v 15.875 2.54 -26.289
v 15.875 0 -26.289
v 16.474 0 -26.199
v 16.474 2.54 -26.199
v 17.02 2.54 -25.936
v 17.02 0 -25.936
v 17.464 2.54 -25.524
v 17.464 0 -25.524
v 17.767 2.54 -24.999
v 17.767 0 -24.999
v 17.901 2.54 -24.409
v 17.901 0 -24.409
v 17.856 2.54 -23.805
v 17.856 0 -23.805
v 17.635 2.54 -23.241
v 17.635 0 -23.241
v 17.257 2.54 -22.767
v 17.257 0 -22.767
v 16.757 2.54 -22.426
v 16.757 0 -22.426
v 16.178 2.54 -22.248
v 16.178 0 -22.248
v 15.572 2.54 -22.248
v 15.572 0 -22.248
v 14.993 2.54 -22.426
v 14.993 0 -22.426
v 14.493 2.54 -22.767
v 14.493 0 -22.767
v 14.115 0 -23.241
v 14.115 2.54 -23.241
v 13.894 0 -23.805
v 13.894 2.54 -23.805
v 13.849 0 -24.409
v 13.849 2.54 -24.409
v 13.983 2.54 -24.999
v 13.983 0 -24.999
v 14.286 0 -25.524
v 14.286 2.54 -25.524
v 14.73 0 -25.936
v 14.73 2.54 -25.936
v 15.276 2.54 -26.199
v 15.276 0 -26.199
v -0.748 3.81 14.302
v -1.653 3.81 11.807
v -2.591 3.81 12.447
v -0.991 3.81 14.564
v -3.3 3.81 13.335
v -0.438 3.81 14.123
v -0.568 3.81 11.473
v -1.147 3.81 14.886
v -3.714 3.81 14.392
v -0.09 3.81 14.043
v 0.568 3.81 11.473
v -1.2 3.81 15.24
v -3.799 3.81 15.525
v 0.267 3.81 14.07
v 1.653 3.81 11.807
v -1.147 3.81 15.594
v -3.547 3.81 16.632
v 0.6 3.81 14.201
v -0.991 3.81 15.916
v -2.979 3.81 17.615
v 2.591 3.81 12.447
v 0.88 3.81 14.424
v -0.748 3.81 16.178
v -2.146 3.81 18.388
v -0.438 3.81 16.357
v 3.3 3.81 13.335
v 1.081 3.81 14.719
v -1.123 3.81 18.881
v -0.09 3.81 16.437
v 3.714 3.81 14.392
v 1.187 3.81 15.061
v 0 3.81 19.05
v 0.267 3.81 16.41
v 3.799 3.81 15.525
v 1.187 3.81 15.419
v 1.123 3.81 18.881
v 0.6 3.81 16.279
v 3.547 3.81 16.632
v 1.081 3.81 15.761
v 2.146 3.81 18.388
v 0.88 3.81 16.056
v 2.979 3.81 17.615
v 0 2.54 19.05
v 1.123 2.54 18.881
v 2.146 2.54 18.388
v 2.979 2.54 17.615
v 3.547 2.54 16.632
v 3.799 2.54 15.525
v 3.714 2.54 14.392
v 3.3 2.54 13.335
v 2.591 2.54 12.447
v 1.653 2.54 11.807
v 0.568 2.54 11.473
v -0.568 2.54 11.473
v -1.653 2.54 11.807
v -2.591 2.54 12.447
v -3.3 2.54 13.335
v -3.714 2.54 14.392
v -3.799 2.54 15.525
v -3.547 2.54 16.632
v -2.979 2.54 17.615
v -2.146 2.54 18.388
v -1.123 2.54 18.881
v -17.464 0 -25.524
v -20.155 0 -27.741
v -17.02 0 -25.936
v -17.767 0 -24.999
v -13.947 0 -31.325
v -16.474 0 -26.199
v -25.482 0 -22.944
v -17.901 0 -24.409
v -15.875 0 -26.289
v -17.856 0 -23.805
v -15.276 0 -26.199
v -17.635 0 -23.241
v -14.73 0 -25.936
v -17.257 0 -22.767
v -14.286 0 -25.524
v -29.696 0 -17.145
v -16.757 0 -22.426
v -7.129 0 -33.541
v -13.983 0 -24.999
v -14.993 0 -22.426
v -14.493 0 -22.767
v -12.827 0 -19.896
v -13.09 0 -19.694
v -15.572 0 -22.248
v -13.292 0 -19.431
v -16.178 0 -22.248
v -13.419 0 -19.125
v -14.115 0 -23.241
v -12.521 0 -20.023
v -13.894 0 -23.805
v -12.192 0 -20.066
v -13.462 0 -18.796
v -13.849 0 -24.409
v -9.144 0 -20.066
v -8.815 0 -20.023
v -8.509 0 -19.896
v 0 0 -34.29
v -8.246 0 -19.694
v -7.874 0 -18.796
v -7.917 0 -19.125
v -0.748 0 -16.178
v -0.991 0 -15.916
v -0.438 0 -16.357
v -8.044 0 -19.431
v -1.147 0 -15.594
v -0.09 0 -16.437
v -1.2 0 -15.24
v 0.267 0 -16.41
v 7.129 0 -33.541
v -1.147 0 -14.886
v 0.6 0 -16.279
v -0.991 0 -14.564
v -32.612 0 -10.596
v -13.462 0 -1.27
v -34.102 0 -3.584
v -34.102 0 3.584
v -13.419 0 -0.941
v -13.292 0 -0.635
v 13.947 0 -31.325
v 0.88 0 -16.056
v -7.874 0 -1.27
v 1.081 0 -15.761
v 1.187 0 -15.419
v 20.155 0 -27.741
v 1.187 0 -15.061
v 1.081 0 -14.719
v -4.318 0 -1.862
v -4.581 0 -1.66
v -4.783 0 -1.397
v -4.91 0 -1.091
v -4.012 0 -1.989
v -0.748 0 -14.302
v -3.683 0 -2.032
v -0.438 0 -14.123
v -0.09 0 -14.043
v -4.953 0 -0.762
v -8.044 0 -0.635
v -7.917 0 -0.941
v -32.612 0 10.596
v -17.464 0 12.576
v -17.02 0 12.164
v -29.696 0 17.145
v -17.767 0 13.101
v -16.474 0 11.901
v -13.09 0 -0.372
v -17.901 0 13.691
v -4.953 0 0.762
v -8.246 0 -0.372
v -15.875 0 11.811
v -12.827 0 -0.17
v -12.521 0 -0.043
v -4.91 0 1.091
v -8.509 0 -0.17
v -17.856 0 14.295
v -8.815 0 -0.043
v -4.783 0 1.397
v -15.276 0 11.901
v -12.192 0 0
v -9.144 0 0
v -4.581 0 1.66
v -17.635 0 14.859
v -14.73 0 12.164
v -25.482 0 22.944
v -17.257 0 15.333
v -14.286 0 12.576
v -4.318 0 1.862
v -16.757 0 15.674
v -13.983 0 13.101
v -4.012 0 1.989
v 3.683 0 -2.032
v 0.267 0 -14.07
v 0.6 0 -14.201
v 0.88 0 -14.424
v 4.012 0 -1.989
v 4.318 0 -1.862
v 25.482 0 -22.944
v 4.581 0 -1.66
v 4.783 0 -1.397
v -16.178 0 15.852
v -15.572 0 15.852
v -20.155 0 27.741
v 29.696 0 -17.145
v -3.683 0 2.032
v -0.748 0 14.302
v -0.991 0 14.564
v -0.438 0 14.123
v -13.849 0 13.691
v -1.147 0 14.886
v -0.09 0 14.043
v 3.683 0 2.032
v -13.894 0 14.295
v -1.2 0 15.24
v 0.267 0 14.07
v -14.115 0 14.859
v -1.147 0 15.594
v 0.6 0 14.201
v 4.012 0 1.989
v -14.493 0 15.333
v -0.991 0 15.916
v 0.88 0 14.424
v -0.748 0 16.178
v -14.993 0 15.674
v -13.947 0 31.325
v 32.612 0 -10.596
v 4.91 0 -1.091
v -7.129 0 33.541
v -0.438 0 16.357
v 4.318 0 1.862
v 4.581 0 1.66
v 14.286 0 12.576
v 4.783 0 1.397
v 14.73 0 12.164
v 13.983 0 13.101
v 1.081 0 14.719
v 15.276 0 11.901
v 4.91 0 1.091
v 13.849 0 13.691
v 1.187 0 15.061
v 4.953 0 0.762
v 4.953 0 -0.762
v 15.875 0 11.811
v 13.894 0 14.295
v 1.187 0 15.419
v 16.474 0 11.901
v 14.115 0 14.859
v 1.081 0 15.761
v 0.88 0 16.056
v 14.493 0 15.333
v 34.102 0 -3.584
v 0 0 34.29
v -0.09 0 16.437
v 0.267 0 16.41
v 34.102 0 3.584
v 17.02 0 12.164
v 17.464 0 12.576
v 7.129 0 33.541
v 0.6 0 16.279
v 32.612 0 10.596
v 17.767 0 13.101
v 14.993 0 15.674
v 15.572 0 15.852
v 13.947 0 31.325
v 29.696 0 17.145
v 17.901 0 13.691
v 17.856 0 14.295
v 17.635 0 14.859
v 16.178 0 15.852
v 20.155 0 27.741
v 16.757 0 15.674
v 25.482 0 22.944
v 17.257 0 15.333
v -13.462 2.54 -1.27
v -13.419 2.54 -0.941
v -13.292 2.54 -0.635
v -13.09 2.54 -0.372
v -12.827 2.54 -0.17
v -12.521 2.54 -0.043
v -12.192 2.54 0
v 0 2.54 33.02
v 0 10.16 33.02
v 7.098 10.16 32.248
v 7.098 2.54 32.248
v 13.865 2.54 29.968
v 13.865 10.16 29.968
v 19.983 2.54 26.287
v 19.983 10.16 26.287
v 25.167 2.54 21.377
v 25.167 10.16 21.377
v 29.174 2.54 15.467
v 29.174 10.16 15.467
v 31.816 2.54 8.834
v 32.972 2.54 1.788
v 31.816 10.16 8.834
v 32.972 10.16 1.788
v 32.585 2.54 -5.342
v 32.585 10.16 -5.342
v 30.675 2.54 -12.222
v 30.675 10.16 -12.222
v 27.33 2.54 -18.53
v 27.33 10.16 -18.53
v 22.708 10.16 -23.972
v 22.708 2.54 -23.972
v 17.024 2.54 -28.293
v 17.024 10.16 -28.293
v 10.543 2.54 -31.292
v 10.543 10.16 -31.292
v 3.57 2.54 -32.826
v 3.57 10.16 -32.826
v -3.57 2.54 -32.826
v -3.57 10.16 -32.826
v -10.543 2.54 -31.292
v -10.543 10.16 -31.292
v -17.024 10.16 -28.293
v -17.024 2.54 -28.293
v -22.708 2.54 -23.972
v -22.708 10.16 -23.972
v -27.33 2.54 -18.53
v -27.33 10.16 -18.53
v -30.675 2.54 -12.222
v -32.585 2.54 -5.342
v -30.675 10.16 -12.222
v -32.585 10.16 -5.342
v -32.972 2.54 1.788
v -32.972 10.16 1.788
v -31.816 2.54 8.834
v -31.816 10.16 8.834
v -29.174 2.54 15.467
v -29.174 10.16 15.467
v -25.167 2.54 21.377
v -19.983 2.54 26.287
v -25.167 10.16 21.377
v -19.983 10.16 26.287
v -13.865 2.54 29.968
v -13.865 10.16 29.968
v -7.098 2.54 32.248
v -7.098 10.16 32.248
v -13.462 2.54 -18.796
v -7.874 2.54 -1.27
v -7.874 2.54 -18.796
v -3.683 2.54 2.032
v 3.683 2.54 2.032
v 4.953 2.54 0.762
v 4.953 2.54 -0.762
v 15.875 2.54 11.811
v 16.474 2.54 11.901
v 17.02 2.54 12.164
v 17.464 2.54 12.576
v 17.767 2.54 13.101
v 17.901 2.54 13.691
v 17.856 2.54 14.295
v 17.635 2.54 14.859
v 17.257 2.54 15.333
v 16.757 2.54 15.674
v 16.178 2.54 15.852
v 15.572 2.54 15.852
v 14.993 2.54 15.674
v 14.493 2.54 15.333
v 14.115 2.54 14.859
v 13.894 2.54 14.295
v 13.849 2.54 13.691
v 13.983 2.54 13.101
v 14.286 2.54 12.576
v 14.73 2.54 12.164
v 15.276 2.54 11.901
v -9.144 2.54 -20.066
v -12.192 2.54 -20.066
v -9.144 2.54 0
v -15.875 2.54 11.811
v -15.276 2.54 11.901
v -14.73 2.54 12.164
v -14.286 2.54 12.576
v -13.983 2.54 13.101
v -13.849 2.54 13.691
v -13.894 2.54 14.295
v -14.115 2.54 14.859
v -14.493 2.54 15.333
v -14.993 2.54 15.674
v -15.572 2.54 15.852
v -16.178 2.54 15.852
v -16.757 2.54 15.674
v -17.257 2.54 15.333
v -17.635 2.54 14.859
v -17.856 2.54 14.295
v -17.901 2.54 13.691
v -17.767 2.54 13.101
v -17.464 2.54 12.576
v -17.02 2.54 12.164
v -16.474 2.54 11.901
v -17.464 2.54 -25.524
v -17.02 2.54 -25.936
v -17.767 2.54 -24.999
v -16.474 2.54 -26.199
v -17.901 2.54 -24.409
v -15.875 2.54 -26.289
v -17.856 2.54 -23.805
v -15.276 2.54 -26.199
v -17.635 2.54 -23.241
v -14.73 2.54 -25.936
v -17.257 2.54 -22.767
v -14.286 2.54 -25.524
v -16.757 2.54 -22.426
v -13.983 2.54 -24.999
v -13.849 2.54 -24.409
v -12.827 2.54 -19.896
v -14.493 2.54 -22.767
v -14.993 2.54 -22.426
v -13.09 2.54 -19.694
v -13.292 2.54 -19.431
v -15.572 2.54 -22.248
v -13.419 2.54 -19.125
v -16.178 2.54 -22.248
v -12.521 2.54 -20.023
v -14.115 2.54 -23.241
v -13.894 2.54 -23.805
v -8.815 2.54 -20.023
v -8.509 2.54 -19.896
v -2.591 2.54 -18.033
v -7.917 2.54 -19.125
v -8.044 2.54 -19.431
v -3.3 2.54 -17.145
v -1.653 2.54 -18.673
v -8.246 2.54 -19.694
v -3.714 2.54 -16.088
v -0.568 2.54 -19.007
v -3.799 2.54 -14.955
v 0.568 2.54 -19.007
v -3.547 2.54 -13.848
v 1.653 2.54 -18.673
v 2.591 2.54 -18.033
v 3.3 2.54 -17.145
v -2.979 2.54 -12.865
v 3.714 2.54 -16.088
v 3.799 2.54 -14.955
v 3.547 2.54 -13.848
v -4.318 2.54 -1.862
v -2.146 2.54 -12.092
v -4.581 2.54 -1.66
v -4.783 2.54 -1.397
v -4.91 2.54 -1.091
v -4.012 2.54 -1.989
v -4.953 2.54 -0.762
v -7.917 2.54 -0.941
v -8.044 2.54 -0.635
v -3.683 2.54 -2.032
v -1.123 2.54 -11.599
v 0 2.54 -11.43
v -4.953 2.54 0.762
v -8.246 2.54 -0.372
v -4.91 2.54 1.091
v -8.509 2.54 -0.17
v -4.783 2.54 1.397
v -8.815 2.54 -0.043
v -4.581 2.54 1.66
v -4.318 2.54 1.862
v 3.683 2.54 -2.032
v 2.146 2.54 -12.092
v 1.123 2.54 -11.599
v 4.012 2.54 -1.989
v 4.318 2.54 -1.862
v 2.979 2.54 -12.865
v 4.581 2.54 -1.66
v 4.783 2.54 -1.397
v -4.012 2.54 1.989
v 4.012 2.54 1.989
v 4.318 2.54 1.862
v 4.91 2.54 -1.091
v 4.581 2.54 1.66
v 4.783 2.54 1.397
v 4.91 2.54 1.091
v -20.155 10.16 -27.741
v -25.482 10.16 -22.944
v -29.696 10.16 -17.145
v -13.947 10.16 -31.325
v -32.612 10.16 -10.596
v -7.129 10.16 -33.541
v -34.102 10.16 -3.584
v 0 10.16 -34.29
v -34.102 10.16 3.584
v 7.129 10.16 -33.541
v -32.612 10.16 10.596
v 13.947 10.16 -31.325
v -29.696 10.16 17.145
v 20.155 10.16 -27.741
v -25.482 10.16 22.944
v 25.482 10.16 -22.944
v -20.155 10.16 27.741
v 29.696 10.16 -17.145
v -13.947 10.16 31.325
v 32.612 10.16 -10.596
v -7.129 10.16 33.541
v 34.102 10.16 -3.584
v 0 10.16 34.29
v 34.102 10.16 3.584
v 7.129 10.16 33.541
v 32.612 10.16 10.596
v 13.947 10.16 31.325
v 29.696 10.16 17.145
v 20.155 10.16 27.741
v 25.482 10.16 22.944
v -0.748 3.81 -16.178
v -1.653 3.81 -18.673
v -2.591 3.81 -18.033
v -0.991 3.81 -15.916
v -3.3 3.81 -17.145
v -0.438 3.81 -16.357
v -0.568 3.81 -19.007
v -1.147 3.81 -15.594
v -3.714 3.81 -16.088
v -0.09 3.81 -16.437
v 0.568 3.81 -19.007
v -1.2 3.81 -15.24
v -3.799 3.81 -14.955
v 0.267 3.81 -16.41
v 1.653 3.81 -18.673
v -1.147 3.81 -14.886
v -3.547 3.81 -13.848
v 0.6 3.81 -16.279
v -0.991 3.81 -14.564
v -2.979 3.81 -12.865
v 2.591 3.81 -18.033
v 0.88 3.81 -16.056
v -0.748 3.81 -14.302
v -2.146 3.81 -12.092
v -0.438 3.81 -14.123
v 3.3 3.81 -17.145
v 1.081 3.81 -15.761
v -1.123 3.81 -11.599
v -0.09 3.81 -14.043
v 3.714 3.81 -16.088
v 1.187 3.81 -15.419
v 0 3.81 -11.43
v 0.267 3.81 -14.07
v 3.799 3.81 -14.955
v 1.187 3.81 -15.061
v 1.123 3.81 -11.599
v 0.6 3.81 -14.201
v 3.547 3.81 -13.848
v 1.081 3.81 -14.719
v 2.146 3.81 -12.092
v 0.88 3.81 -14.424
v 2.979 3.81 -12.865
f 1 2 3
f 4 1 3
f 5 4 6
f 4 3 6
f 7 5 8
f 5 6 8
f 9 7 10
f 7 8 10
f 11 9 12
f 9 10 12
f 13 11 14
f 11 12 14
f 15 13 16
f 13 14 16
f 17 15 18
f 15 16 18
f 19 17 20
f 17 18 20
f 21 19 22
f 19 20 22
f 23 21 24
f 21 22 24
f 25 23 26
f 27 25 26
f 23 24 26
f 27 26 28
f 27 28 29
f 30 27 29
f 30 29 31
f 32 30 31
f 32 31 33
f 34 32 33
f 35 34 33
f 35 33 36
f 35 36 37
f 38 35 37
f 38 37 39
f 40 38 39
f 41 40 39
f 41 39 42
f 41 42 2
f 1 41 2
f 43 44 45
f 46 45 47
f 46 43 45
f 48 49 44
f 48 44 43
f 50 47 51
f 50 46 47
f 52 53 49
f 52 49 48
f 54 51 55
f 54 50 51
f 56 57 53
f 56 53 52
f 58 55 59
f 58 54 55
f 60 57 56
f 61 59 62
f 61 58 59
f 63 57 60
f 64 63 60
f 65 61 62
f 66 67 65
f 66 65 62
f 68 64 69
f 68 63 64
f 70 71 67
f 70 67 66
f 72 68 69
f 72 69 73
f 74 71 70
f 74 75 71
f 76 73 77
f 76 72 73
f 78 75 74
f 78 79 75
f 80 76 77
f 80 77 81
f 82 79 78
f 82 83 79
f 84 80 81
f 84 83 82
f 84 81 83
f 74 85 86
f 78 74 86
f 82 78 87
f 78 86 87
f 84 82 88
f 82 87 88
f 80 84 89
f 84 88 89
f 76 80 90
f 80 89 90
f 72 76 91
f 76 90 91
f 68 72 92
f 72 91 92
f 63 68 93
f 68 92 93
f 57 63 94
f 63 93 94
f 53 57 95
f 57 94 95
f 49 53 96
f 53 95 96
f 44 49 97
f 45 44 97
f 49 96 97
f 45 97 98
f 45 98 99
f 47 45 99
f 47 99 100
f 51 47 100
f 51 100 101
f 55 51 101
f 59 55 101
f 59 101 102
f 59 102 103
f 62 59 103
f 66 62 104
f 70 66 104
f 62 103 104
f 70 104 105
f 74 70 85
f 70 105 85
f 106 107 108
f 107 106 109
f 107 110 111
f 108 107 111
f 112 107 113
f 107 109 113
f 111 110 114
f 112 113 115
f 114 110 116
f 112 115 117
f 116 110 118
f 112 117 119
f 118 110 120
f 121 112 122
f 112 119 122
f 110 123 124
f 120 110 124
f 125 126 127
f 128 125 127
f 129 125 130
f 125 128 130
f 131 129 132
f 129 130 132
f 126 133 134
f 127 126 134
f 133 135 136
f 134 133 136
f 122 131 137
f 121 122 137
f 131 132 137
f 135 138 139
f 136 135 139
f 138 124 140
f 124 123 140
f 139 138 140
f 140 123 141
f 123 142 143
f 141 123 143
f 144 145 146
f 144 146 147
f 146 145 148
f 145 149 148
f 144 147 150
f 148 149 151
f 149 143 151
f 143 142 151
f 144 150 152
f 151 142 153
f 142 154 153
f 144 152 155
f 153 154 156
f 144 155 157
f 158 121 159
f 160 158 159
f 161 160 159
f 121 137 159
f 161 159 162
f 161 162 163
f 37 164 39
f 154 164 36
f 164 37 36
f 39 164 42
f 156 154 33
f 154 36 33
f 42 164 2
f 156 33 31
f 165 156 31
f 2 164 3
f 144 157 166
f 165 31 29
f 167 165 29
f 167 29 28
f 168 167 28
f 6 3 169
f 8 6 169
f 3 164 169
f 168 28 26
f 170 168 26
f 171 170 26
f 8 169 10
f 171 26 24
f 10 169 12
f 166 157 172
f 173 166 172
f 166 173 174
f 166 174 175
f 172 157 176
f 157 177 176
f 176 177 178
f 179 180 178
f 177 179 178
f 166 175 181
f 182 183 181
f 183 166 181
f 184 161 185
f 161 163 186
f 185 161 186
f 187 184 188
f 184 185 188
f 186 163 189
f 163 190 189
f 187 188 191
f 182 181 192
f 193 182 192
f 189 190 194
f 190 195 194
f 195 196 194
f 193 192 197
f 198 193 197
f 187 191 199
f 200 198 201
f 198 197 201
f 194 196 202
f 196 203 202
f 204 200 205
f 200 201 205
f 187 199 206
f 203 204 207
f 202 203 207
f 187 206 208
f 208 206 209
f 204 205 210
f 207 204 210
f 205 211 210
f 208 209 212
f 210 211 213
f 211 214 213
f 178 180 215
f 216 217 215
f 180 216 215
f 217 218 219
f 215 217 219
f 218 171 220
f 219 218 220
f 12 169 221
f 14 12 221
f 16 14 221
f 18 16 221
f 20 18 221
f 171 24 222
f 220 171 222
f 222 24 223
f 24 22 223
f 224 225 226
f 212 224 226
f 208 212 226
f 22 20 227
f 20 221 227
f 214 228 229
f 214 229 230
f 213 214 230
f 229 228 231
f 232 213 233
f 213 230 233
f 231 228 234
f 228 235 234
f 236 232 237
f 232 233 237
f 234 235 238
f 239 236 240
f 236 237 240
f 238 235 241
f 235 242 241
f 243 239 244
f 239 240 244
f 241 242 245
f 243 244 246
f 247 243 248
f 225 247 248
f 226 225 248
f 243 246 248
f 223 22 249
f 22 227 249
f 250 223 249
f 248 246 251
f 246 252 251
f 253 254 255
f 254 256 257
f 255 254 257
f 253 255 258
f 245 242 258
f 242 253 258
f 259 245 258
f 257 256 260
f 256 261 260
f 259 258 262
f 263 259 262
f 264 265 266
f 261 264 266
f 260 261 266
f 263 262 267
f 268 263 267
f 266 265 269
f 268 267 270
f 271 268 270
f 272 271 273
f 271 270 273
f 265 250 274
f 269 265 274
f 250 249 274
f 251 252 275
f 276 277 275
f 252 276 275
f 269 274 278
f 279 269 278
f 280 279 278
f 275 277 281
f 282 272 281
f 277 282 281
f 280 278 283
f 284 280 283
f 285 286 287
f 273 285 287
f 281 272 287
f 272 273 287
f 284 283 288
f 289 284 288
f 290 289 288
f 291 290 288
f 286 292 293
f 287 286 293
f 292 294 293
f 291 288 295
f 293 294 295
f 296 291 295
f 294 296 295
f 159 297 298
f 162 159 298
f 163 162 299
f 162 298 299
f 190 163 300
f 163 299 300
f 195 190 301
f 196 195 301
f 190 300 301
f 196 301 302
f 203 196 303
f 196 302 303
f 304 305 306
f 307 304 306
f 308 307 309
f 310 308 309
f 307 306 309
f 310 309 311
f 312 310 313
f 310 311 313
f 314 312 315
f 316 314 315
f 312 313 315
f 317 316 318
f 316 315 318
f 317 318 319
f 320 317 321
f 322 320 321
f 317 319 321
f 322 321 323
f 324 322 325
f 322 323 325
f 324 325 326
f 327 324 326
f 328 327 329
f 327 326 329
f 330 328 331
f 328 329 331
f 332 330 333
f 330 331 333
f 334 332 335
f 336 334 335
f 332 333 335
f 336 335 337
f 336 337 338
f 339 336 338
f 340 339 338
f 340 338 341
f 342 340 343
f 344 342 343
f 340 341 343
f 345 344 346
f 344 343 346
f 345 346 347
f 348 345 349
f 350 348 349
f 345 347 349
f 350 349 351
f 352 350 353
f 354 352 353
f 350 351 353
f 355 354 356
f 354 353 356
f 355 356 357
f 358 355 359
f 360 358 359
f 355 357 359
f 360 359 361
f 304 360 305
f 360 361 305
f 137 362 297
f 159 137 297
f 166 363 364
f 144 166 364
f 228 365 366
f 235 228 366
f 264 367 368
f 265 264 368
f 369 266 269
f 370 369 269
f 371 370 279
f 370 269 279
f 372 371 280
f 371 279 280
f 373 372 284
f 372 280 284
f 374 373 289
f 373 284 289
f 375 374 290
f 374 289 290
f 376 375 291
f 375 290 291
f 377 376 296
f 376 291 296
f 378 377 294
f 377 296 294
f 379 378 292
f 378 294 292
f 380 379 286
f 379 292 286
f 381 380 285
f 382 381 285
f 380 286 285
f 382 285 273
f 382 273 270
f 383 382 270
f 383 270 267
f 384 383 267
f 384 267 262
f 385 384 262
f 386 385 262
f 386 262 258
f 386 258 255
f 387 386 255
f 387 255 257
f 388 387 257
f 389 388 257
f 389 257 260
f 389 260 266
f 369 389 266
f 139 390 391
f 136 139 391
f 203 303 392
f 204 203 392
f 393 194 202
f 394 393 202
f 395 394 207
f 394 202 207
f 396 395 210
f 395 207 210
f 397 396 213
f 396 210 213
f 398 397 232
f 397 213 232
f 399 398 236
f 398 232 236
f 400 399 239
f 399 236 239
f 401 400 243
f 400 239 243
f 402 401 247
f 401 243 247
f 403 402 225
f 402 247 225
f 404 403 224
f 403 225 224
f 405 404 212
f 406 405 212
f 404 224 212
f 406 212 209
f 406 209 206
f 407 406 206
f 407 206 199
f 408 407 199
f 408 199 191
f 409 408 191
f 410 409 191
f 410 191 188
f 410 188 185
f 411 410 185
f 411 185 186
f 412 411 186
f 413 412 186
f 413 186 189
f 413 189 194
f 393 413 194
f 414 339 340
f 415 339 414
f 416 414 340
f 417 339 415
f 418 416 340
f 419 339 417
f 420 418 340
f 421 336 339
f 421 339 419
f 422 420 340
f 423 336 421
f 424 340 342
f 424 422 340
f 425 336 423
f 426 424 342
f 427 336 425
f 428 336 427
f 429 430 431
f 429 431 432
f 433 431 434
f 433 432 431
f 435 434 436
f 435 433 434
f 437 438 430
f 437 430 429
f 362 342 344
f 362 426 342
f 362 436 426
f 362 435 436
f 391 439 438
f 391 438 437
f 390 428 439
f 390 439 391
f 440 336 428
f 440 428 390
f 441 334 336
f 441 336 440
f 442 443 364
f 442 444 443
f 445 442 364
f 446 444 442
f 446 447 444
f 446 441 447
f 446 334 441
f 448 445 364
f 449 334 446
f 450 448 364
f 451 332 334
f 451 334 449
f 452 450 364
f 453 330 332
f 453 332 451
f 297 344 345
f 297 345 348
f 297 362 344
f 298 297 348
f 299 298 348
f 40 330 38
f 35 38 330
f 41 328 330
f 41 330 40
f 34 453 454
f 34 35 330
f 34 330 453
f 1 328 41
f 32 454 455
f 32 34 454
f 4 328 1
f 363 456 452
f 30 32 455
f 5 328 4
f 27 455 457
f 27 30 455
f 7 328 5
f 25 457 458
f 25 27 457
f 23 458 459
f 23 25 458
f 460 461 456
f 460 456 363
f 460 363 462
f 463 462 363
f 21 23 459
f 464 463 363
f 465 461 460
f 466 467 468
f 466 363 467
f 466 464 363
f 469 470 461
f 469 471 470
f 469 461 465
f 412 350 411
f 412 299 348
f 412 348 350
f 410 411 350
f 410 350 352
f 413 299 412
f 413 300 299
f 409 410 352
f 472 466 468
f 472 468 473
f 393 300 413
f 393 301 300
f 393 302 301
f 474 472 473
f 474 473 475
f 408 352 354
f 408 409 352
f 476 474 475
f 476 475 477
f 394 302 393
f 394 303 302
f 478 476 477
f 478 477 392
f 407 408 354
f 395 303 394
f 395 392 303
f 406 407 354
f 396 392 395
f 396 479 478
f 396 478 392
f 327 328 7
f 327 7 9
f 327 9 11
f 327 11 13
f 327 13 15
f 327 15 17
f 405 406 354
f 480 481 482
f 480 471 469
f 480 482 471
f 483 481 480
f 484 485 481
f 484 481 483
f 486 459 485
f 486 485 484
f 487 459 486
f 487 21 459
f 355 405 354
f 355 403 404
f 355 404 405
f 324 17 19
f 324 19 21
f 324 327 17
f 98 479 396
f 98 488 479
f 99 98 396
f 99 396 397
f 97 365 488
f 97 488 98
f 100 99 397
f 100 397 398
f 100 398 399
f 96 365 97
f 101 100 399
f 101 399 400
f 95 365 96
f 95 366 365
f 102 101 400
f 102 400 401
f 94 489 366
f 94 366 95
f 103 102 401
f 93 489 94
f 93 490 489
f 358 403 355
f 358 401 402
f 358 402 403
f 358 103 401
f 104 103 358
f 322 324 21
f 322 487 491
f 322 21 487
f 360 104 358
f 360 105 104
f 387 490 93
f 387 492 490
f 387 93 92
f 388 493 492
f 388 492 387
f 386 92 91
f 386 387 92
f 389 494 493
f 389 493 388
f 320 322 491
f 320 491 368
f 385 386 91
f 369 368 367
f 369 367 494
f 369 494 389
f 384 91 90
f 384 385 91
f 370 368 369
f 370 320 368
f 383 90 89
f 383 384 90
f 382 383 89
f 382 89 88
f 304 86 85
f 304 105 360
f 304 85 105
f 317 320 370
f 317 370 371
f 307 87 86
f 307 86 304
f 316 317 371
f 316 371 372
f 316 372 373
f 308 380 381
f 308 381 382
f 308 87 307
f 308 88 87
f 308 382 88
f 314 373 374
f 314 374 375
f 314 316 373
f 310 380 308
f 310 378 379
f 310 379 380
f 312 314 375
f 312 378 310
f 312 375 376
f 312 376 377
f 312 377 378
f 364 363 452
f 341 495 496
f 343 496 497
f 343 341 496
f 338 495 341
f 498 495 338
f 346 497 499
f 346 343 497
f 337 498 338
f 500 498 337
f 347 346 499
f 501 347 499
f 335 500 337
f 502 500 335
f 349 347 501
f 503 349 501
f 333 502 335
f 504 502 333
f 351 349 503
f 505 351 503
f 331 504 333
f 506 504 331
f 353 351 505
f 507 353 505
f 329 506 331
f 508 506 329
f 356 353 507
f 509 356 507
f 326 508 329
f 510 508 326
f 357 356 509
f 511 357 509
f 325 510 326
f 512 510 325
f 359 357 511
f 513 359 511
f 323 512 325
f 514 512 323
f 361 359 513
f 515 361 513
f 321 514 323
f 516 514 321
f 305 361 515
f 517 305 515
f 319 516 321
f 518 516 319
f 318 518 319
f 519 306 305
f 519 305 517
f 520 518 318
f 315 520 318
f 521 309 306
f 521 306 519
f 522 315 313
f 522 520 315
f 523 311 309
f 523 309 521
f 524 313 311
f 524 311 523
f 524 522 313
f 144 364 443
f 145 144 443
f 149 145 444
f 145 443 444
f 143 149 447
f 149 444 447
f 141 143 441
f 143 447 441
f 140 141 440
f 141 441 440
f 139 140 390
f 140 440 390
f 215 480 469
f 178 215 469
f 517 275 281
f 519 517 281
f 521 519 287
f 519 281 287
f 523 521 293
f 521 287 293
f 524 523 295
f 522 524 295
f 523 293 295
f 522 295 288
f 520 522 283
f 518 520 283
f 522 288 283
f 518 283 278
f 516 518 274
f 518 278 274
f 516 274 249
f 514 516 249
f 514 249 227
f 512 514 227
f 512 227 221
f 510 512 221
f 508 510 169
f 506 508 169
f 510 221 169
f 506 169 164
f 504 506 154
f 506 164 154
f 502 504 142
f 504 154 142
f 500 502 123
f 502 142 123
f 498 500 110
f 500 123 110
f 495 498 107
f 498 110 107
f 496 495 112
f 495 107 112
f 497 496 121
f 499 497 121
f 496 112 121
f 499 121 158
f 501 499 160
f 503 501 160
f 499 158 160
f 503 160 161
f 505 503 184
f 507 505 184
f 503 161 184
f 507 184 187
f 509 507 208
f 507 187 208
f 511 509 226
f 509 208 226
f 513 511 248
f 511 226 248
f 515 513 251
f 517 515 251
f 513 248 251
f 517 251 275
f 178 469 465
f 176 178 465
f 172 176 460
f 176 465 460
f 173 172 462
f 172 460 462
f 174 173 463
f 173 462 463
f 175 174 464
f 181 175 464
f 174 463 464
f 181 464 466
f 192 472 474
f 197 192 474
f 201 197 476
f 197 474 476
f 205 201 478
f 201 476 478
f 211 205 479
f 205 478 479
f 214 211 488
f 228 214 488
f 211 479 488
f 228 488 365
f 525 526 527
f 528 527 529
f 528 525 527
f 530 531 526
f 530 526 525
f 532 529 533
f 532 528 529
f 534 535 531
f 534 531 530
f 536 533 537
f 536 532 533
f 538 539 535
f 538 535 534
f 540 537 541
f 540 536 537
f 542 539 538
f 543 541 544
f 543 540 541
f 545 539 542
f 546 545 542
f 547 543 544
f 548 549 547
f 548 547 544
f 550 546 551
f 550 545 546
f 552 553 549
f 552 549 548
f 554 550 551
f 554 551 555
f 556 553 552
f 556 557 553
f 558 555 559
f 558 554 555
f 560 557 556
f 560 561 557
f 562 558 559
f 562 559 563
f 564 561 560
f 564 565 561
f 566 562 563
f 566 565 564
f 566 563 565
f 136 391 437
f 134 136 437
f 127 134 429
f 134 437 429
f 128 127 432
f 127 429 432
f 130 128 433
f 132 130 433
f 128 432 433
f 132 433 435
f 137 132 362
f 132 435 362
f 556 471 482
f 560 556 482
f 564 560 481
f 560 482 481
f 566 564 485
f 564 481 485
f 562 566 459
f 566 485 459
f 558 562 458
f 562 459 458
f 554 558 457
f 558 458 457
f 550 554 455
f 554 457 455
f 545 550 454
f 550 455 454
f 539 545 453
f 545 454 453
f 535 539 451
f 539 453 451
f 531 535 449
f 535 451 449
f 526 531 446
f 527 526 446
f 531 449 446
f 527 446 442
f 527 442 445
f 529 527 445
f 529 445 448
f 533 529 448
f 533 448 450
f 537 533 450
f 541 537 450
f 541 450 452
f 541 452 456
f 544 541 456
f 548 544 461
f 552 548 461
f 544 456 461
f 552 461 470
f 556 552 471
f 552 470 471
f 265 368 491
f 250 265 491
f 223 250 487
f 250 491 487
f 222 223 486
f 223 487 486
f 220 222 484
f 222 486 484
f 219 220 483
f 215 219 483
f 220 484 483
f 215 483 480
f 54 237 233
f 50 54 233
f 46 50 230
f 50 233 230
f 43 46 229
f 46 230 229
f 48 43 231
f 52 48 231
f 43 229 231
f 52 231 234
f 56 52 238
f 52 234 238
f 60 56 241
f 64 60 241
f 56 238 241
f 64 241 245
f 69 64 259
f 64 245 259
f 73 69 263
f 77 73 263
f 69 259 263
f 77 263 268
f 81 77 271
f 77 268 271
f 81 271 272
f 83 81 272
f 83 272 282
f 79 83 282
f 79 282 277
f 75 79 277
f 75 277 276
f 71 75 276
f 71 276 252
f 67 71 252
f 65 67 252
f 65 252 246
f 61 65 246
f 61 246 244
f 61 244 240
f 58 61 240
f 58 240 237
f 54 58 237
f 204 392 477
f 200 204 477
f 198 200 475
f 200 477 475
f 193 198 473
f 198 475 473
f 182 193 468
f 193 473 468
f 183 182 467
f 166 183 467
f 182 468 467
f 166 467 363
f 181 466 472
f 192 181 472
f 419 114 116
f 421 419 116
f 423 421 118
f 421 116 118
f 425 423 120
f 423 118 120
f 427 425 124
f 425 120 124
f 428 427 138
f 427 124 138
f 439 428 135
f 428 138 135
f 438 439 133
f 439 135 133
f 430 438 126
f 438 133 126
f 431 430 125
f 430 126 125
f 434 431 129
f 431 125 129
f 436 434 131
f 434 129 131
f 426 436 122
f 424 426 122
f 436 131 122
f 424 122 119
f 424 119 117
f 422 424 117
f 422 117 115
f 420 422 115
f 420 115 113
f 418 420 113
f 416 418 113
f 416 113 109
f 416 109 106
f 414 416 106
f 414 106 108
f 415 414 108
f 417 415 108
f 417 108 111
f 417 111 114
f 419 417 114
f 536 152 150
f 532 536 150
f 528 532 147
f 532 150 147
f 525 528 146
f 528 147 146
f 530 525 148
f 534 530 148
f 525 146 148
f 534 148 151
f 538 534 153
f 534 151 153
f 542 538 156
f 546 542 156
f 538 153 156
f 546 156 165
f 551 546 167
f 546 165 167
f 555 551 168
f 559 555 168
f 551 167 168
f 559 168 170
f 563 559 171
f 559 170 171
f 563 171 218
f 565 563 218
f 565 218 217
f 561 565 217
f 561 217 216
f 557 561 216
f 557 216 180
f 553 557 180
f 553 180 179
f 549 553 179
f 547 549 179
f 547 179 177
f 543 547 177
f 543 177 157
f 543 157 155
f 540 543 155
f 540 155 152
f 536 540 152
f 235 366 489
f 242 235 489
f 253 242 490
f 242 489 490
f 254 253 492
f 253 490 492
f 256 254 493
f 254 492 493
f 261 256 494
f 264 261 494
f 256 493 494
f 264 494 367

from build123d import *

# Parameters (mm, degrees)
SKETCH1_R            = 34.29
BOSS_EXTRUDE1_DEPTH  = 10.16
SKETCH2_R            = 33.02
CUT_EXTRUDE1_DEPTH   = 7.62
SKETCH3_R            = 3.81
BOSS_EXTRUDE2_DEPTH  = 1.27
CUT_EXTRUDE3_REACH   = 51.088
CUT_EXTRUDE4_REACH   = 51.088
CUT_EXTRUDE5_REACH   = 51.546
SKETCH11_R           = 2.032
M2_CLEARANCE_HOLE1_D = 2.4


with BuildPart() as part:
    # Sketch1 → Boss-Extrude1 (new body)
    with BuildSketch(Plane(origin=(0, 0, 0), x_dir=(1, 0, 0), z_dir=(0, 1, 0))):
        with Locations(Location((0, 0, 0), (0, 0, 270))):
            Circle(SKETCH1_R)
    extrude(amount=BOSS_EXTRUDE1_DEPTH)

    # Sketch2 → Cut-Extrude1 (cut)
    with BuildSketch(Plane(origin=(0, 10.16, 0), x_dir=(1, 0, 0), z_dir=(0, 1, 0))):
        with Locations(Location((0, 0, 0), (0, 0, 270))):
            Circle(SKETCH2_R)
    extrude(amount=-CUT_EXTRUDE1_DEPTH, mode=Mode.SUBTRACT)

    # Sketch3 → Boss-Extrude2 (add)
    with BuildSketch(Plane(origin=(0, 2.54, 0), x_dir=(1, 0, 0), z_dir=(0, 1, 0))):
        with Locations(Location((0, -15.24, 0), (0, 0, 270))):
            Circle(SKETCH3_R)
        with Locations(Location((0, 15.24, 0), (0, 0, 270))):
            Circle(SKETCH3_R)
    extrude(amount=BOSS_EXTRUDE2_DEPTH)

    # Sketch8 → Cut-Extrude3 (cut, up to next)
    with BuildSketch(Plane(origin=(0, 2.54, 0), x_dir=(1, 0, 0), z_dir=(0, 1, 0)), mode=Mode.PRIVATE) as cut_extrude3_sk1:
        with BuildLine():
            Line((3.683, 2.032), (-3.683, 2.032))
            ThreePointArc((-3.683, 2.032), (-4.581025612, 1.660025612), (-4.953, 0.762))
            Line((-4.953, 0.762), (-4.953, -0.762))
            ThreePointArc((-4.953, -0.762), (-4.581025612, -1.660025612), (-3.683, -2.032))
            Line((-3.683, -2.032), (3.683, -2.032))
            ThreePointArc((3.683, -2.032), (4.581025612, -1.660025612), (4.953, -0.762))
            Line((4.953, -0.762), (4.953, 0.762))
            ThreePointArc((4.953, 0.762), (4.581025612, 1.660025612), (3.683, 2.032))
        make_face()
    cut_extrude3_tool1 = extrude(cut_extrude3_sk1.sketch, amount=-CUT_EXTRUDE3_REACH, mode=Mode.PRIVATE) & part.part
    add(cut_extrude3_tool1.solids().sort_by_distance((0, 2.54, 0))[0], mode=Mode.SUBTRACT)

    # Sketch9 → Cut-Extrude4 (cut, up to next)
    with BuildSketch(Plane(origin=(0, 2.54, 0), x_dir=(1, 0, 0), z_dir=(0, 1, 0)), mode=Mode.PRIVATE) as cut_extrude4_sk1:
        with BuildLine():
            Line((-12.192, 0), (-9.144, 0))
            ThreePointArc((-9.144, 0), (-8.245974388, 0.371974388), (-7.874, 1.27))
            Line((-7.874, 1.27), (-7.874, 18.796))
            ThreePointArc((-7.874, 18.796), (-8.245974388, 19.694025612), (-9.144, 20.066))
            Line((-9.144, 20.066), (-12.192, 20.066))
            ThreePointArc((-12.192, 20.066), (-13.090025612, 19.694025612), (-13.462, 18.796))
            Line((-13.462, 18.796), (-13.462, 1.27))
            ThreePointArc((-13.462, 1.27), (-13.090025612, 0.371974388), (-12.192, 0))
        make_face()
    cut_extrude4_tool1 = extrude(cut_extrude4_sk1.sketch, amount=-CUT_EXTRUDE4_REACH, mode=Mode.PRIVATE) & part.part
    add(cut_extrude4_tool1.solids().sort_by_distance((-10.668, 2.54, -10.033))[0], mode=Mode.SUBTRACT)

    # Sketch11 → Cut-Extrude5 (cut, up to next)
    with BuildSketch(Plane.XZ, mode=Mode.PRIVATE) as cut_extrude5_sk1:
        with Locations(Location((15.875, 13.843, 0), (0, 0, 270))):
            Circle(SKETCH11_R)
    cut_extrude5_tool1 = extrude(cut_extrude5_sk1.sketch, amount=-CUT_EXTRUDE5_REACH, mode=Mode.PRIVATE) & part.part
    # Sketch11 → Cut-Extrude5 (cut, up to next)
    with BuildSketch(Plane.XZ, mode=Mode.PRIVATE) as cut_extrude5_sk2:
        with Locations(Location((-15.875, 13.843, 0), (0, 0, 270))):
            Circle(SKETCH11_R)
    cut_extrude5_tool2 = extrude(cut_extrude5_sk2.sketch, amount=-CUT_EXTRUDE5_REACH, mode=Mode.PRIVATE) & part.part
    # Sketch11 → Cut-Extrude5 (cut, up to next)
    with BuildSketch(Plane.XZ, mode=Mode.PRIVATE) as cut_extrude5_sk3:
        with Locations(Location((-15.875, -24.257, 0), (0, 0, 270))):
            Circle(SKETCH11_R)
    cut_extrude5_tool3 = extrude(cut_extrude5_sk3.sketch, amount=-CUT_EXTRUDE5_REACH, mode=Mode.PRIVATE) & part.part
    # Sketch11 → Cut-Extrude5 (cut, up to next)
    with BuildSketch(Plane.XZ, mode=Mode.PRIVATE) as cut_extrude5_sk4:
        with Locations(Location((15.875, -24.257, 0), (0, 0, 270))):
            Circle(SKETCH11_R)
    cut_extrude5_tool4 = extrude(cut_extrude5_sk4.sketch, amount=-CUT_EXTRUDE5_REACH, mode=Mode.PRIVATE) & part.part
    add(cut_extrude5_tool1.solids().sort_by_distance((15.875, 0, 13.843))[0], mode=Mode.SUBTRACT)
    add(cut_extrude5_tool2.solids().sort_by_distance((-15.875, 0, 13.843))[0], mode=Mode.SUBTRACT)
    add(cut_extrude5_tool3.solids().sort_by_distance((-15.875, 0, -24.257))[0], mode=Mode.SUBTRACT)
    add(cut_extrude5_tool4.solids().sort_by_distance((15.875, 0, -24.257))[0], mode=Mode.SUBTRACT)

    # M2 Clearance Hole1 (through all)
    with Locations(Plane(origin=(0, 3.81, 0), x_dir=(1, 0, 0), z_dir=(0, 1, 0))):
        with Locations((0, 15.24), (0, -15.24)):
            Hole(M2_CLEARANCE_HOLE1_D / 2)


solid = part.part
